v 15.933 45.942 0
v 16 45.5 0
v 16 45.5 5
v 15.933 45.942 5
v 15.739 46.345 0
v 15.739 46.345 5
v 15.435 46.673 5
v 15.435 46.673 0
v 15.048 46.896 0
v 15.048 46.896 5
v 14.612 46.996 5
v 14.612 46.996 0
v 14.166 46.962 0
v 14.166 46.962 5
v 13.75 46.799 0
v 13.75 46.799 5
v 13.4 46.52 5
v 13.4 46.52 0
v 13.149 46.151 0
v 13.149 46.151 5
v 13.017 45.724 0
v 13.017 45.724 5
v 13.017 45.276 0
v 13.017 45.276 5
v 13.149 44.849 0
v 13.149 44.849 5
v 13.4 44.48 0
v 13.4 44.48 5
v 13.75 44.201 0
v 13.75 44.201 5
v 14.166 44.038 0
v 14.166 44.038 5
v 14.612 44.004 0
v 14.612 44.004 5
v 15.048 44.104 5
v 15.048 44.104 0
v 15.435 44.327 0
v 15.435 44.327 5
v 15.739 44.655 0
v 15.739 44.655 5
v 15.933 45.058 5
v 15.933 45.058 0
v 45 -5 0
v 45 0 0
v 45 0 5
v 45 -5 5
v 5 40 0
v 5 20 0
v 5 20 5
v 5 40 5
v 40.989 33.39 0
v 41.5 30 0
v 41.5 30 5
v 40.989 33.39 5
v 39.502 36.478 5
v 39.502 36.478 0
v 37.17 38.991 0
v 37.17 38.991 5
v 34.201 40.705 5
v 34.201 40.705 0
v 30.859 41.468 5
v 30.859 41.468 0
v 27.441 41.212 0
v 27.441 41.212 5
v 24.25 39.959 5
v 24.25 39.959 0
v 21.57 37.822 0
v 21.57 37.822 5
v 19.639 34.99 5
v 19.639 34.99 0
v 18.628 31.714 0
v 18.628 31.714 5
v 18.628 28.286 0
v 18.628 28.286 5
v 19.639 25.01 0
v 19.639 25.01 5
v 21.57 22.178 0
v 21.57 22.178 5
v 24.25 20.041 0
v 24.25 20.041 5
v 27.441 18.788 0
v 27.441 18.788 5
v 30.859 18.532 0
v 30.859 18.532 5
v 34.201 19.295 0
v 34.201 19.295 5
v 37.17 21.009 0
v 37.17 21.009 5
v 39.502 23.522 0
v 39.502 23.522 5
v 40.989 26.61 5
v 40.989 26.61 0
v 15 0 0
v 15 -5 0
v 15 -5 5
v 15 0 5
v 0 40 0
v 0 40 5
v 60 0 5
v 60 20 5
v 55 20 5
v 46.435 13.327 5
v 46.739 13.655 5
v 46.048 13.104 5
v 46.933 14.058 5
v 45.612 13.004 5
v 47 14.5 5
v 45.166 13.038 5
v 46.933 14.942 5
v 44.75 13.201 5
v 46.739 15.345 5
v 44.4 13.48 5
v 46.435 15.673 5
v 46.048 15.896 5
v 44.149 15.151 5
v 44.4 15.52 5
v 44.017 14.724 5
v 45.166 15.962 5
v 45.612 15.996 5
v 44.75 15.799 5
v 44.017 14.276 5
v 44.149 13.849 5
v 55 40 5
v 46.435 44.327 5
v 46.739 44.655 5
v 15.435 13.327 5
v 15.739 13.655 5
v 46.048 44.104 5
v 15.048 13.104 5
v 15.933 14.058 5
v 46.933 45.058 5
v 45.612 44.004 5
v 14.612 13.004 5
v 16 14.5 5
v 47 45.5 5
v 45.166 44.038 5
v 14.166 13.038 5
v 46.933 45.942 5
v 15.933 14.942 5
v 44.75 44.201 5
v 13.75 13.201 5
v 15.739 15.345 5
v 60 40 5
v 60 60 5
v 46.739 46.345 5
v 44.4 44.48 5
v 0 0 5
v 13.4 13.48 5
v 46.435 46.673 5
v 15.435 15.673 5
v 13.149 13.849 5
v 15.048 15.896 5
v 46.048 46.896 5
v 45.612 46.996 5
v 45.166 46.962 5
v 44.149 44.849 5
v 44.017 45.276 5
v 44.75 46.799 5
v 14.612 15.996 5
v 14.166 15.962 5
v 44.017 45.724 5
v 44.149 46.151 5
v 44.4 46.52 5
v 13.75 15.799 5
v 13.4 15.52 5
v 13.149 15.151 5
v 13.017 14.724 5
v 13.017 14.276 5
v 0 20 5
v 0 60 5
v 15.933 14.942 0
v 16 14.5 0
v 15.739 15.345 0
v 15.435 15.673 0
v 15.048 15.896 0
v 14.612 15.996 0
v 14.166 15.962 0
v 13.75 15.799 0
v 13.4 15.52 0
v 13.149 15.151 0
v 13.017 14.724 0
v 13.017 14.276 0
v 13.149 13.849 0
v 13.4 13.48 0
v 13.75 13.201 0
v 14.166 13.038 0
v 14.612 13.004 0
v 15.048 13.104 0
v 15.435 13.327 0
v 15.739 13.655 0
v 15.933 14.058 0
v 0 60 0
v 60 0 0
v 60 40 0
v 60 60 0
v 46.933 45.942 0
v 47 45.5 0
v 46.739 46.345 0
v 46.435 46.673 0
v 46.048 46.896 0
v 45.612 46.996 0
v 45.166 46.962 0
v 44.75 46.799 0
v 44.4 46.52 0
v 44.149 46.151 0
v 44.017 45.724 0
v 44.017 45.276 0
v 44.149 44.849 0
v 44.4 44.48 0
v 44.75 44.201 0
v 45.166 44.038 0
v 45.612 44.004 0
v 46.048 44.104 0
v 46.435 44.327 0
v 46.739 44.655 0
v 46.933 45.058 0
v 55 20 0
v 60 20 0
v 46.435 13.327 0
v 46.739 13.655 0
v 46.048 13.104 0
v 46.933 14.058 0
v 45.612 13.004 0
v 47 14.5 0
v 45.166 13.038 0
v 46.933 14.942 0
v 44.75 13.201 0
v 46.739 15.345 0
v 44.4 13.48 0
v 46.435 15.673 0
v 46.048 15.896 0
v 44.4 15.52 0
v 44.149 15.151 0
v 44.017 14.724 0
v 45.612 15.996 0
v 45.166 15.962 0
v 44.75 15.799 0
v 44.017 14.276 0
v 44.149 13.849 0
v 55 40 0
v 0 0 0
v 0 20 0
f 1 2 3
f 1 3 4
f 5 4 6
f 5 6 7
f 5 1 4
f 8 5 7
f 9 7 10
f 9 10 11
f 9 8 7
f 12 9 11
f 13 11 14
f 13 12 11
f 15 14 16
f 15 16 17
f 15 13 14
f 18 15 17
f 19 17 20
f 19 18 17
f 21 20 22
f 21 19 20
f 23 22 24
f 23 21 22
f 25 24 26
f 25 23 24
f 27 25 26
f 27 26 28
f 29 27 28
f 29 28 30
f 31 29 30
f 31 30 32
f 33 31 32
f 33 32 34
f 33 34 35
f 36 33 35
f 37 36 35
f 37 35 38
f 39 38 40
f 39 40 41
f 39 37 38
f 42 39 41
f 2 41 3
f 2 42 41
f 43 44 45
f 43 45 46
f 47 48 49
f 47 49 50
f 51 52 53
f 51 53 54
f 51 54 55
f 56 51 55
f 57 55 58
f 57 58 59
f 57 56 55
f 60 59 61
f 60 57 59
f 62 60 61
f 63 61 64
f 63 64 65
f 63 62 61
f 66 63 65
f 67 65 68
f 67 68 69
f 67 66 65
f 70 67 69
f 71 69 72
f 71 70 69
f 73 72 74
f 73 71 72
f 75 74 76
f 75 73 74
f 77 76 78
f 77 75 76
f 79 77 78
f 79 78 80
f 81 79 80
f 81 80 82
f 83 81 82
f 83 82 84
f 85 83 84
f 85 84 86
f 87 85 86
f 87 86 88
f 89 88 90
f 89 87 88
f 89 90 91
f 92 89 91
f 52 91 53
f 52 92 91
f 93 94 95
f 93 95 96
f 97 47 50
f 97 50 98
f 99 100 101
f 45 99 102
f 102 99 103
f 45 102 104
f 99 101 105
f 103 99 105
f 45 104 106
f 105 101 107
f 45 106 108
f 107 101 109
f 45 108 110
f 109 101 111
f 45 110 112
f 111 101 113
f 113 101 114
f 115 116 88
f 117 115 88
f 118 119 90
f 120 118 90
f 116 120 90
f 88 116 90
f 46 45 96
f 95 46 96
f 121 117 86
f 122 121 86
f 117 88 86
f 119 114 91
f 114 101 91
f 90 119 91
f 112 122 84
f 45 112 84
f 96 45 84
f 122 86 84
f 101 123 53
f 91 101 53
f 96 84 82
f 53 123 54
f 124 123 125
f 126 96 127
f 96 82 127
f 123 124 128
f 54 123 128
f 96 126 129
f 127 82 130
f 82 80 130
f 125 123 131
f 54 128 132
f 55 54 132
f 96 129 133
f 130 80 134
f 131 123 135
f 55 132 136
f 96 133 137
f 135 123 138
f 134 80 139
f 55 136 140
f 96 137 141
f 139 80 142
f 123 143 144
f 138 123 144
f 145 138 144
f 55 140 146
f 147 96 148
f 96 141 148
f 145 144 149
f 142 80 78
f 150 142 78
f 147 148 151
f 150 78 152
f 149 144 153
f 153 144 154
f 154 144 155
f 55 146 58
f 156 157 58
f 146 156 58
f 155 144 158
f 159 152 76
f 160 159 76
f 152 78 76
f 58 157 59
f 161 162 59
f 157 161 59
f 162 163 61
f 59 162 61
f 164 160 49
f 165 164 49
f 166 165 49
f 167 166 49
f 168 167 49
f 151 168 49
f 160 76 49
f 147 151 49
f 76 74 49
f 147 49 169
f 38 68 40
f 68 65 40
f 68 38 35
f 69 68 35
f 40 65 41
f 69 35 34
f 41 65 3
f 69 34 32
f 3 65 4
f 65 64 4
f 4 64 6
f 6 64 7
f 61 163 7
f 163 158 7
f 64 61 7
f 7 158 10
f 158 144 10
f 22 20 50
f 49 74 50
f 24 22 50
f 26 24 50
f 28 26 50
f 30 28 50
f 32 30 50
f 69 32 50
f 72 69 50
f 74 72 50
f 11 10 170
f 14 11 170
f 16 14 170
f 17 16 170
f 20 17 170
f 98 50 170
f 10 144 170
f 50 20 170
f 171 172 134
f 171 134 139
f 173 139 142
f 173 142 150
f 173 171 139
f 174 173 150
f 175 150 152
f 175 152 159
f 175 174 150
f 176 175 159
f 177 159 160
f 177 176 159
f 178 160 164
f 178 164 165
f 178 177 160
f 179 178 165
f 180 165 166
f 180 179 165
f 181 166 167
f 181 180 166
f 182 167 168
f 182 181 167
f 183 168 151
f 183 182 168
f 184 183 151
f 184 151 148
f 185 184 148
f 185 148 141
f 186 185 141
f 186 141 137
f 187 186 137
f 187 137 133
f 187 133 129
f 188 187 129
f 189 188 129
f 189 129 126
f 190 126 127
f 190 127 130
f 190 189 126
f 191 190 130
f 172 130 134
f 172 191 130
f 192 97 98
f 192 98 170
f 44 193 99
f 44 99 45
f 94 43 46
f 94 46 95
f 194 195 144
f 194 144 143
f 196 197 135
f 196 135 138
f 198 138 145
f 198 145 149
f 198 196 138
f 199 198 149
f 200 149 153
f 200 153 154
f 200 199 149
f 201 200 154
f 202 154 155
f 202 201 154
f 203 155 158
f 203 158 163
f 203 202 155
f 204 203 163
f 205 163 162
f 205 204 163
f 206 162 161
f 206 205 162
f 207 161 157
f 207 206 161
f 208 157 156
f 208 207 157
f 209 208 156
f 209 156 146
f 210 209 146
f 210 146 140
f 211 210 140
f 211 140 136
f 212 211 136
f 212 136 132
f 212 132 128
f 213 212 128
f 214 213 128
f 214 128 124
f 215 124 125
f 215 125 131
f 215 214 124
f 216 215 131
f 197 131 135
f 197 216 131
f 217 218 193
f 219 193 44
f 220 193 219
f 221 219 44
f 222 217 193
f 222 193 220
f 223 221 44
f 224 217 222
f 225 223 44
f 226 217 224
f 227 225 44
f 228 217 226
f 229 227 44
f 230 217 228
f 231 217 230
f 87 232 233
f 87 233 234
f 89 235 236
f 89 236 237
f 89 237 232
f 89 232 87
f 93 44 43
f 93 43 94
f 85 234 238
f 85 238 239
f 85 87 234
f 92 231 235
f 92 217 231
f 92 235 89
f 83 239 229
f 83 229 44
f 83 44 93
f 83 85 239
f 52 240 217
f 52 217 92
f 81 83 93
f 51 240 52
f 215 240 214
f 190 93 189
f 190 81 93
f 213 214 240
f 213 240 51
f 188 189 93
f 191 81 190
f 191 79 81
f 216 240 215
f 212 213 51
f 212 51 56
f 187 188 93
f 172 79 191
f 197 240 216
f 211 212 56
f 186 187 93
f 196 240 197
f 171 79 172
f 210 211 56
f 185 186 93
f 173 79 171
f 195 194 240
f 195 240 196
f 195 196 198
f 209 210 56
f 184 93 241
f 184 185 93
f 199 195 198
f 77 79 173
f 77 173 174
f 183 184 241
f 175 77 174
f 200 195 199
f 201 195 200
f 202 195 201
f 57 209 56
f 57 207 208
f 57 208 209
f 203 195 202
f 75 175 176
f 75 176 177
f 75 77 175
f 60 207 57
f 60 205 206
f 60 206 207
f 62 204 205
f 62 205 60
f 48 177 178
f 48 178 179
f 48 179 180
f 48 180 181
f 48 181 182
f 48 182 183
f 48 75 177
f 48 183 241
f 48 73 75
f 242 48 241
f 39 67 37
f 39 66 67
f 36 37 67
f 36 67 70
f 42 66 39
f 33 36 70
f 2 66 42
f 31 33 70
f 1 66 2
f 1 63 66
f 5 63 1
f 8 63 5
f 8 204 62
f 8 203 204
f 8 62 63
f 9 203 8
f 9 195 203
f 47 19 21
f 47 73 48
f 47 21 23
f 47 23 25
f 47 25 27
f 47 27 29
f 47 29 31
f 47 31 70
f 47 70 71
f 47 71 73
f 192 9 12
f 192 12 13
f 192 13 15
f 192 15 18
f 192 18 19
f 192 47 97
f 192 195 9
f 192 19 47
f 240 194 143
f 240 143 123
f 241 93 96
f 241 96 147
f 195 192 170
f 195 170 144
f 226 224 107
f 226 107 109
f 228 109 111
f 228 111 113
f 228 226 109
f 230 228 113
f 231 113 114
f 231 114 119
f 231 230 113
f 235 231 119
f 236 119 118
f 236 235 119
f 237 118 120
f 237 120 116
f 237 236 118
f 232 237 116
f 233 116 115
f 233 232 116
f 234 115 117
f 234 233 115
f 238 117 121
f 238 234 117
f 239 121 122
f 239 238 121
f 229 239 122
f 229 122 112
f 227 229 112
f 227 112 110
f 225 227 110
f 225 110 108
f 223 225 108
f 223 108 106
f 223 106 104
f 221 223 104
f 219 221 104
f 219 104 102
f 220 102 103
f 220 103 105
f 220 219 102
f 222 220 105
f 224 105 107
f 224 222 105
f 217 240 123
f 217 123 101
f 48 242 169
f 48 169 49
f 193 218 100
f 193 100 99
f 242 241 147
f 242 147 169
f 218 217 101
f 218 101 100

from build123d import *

# Parameters (mm, degrees)
SKETCH_1_R      = 11.5
SKETCH_1_R_2    = 1.5
EXTRUDE_1_DEPTH = 5


with BuildPart() as part:
    # 草图1 → 凸台-拉伸1 (new body)
    with BuildSketch(Plane.XY):
        Polygon((0, 40), (0, 60), (60, 60), (60, 40), (55, 40), (55, 20), (60, 20), (60, 0), (45, 0), (45, -5), (15, -5), (15, 0), (0, 0), (0, 20), (5, 20), (5, 40), align=None)
        with Locations((30, 30)):
            Circle(SKETCH_1_R, mode=Mode.SUBTRACT)
        with Locations((14.5, 45.5)):
            Circle(SKETCH_1_R_2, mode=Mode.SUBTRACT)
        with Locations((45.5, 45.5)):
            Circle(SKETCH_1_R_2, mode=Mode.SUBTRACT)
        with Locations((45.5, 14.5)):
            Circle(SKETCH_1_R_2, mode=Mode.SUBTRACT)
        with Locations((14.5, 14.5)):
            Circle(SKETCH_1_R_2, mode=Mode.SUBTRACT)
    extrude(amount=EXTRUDE_1_DEPTH)


solid = part.part
